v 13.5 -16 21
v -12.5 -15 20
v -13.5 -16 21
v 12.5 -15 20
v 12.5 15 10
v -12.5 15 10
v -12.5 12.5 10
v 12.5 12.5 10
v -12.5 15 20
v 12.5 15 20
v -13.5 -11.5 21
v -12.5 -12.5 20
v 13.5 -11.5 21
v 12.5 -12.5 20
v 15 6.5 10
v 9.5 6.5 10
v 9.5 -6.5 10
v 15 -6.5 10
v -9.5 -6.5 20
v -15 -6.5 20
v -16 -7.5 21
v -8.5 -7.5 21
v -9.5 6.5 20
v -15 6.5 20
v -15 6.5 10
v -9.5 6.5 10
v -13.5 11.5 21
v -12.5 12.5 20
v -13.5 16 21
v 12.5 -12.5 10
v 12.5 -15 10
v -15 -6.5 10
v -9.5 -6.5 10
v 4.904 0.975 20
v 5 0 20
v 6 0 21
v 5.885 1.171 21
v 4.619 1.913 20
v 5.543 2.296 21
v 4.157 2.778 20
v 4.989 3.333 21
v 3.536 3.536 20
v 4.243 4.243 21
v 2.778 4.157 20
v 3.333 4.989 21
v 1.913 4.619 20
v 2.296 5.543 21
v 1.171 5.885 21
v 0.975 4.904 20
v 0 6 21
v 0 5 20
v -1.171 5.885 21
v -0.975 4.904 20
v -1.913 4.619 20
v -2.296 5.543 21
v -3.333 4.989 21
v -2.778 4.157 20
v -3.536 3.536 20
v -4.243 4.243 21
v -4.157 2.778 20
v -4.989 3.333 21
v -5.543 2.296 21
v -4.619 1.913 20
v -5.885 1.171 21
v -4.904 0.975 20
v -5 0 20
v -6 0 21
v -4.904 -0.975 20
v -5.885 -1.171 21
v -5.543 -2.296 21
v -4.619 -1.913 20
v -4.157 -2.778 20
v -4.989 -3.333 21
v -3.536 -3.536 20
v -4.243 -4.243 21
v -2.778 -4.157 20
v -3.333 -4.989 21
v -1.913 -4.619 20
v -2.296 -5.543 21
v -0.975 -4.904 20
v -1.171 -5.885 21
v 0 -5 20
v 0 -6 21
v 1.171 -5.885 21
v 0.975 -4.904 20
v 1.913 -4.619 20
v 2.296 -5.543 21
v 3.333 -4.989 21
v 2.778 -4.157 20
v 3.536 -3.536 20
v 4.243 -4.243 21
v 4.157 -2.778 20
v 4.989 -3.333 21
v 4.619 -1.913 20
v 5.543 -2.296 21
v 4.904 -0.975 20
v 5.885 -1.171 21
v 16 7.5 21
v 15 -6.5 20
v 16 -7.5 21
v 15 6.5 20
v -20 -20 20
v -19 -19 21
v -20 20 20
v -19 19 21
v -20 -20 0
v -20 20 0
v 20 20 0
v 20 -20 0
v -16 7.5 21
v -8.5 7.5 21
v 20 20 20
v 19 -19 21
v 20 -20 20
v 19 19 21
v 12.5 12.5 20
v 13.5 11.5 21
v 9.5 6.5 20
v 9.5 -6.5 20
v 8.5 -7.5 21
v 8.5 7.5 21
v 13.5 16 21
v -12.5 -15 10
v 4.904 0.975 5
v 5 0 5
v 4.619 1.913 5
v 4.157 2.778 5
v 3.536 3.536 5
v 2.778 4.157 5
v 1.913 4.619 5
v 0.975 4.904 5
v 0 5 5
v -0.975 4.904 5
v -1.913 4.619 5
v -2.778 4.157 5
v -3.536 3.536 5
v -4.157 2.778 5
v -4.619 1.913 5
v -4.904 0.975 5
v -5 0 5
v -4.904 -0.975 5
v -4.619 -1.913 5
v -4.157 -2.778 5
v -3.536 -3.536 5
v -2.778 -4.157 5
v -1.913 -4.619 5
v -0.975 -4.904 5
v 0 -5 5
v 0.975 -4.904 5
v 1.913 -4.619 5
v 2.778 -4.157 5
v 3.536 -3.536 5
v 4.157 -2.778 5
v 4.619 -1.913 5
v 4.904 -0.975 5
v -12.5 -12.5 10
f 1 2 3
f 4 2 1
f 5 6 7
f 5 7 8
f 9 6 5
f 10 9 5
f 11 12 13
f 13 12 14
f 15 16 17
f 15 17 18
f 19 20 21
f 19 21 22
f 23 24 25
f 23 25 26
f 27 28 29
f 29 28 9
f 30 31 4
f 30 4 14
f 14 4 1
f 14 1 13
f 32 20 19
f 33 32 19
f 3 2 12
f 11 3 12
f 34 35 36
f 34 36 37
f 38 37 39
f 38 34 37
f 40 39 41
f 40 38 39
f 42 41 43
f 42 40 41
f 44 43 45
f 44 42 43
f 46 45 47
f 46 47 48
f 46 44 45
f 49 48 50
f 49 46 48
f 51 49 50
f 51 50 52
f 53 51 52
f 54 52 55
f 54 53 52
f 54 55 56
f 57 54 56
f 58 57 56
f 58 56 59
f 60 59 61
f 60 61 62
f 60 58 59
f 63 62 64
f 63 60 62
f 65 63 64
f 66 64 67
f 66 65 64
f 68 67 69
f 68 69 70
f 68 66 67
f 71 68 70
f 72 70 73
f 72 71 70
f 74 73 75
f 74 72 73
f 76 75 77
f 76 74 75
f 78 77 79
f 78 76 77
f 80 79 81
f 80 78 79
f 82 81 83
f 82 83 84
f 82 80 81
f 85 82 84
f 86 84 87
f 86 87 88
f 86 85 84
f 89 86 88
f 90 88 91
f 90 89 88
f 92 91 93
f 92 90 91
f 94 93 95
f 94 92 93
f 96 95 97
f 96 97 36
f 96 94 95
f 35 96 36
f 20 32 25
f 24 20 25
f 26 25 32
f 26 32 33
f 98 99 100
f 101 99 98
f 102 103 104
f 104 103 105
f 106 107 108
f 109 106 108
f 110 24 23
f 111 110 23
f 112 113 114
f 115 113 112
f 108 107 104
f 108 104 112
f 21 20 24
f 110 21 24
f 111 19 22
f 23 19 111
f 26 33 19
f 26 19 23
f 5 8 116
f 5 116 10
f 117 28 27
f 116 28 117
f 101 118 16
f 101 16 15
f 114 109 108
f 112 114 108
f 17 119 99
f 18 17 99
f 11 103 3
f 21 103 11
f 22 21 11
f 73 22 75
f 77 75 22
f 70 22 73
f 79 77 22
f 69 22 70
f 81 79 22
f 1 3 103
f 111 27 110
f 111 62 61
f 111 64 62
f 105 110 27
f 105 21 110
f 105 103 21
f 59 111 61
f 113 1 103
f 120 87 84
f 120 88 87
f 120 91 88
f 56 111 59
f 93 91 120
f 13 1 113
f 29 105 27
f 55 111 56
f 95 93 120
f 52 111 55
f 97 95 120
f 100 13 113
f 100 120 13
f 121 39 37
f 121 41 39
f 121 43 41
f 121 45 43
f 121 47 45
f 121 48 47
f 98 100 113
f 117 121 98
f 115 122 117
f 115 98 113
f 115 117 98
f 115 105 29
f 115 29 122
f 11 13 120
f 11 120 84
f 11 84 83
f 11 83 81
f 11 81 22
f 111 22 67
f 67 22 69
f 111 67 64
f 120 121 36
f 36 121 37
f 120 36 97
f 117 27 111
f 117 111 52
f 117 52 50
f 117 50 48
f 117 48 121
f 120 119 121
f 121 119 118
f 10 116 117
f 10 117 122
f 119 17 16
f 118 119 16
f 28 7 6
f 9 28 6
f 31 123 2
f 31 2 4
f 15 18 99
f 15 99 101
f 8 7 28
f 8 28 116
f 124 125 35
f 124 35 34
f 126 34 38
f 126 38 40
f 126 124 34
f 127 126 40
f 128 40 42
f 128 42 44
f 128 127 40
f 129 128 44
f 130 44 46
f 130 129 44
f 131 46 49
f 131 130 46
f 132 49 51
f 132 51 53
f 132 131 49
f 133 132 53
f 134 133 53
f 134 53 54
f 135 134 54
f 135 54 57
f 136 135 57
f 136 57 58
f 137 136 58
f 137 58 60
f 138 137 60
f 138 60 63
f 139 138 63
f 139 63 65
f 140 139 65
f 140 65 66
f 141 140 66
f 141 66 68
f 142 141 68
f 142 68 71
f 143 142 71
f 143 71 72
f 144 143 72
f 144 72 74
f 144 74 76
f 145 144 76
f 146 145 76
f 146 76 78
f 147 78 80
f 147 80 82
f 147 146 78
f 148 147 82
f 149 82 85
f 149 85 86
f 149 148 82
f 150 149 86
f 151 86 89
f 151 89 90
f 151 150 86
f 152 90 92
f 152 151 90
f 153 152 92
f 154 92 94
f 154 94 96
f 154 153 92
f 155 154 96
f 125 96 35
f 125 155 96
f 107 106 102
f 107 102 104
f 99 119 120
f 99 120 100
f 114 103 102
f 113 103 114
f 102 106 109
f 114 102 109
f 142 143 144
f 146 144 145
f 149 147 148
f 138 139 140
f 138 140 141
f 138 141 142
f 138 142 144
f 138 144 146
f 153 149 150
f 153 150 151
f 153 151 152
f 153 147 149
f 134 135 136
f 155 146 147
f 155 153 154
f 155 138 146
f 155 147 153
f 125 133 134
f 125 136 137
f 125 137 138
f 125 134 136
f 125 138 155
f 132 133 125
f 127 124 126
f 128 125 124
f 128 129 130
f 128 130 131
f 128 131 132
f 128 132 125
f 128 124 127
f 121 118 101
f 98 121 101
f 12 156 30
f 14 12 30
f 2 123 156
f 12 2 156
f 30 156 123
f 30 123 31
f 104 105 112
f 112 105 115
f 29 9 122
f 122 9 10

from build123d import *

# Parameters (mm, degrees)
F0_W     = 40
F0_H     = 40
F1_DEPTH = 10
F2_W     = 40
F2_H     = 40
F2_W_2   = 25
F2_H_2   = 2.5
F2_W_3   = 5.5
F2_H_3   = 13
F2_R     = 5
F3_DEPTH = 11
F4_DEPTH = 5
F5_SIZE  = 1


with BuildPart() as f1:
    # F0 (on Top) → F1 (new body)
    with BuildSketch(Plane.XY):
        Rectangle(F0_W, F0_H)
    extrude(amount=F1_DEPTH)

    # F2 (on face) → F3 (join)
    with BuildSketch(Plane.XY.offset(10)):
        Rectangle(F2_W, F2_H)
        with Locations((0, -13.75)):
            Rectangle(F2_W_2, F2_H_2, mode=Mode.SUBTRACT)
        with Locations((-12.25, 0)):
            Rectangle(F2_W_3, F2_H_3, mode=Mode.SUBTRACT)
        Circle(F2_R, mode=Mode.SUBTRACT)
        with Locations((12.25, 0)):
            Rectangle(F2_W_3, F2_H_3, mode=Mode.SUBTRACT)
        with Locations((0, 13.75)):
            Rectangle(F2_W_2, F2_H_2, mode=Mode.SUBTRACT)
    extrude(amount=F3_DEPTH)

    # F4 (cut): a face of the model
    f4_faces = [f1.faces().sort_by_distance(p)[0] for p in [
        (0, 0, 10),
    ]]
    extrude(f4_faces, amount=-F4_DEPTH, mode=Mode.SUBTRACT)

    # F5
    f5_edges = [f1.edges().sort_by_distance(p)[0] for p in [
        (0, -20, 21),
        (20, 0, 21),
        (0, 20, 21),
        (-20, 0, 21),
        (0, -12.5, 21),
        (12.5, -13.75, 21),
        (0, -15, 21),
        (-12.5, -13.75, 21),
        (-12.25, 6.5, 21),
        (-9.5, 0, 21),
        (-12.25, -6.5, 21),
        (-15, 0, 21),
        (-5, 0, 21),
        (12.25, 6.5, 21),
        (15, 0, 21),
        (12.25, -6.5, 21),
        (9.5, 0, 21),
        (0, 15, 21),
        (12.5, 13.75, 21),
        (0, 12.5, 21),
        (-12.5, 13.75, 21),
    ]]
    chamfer(f5_edges, length=F5_SIZE)


solid = f1.part
